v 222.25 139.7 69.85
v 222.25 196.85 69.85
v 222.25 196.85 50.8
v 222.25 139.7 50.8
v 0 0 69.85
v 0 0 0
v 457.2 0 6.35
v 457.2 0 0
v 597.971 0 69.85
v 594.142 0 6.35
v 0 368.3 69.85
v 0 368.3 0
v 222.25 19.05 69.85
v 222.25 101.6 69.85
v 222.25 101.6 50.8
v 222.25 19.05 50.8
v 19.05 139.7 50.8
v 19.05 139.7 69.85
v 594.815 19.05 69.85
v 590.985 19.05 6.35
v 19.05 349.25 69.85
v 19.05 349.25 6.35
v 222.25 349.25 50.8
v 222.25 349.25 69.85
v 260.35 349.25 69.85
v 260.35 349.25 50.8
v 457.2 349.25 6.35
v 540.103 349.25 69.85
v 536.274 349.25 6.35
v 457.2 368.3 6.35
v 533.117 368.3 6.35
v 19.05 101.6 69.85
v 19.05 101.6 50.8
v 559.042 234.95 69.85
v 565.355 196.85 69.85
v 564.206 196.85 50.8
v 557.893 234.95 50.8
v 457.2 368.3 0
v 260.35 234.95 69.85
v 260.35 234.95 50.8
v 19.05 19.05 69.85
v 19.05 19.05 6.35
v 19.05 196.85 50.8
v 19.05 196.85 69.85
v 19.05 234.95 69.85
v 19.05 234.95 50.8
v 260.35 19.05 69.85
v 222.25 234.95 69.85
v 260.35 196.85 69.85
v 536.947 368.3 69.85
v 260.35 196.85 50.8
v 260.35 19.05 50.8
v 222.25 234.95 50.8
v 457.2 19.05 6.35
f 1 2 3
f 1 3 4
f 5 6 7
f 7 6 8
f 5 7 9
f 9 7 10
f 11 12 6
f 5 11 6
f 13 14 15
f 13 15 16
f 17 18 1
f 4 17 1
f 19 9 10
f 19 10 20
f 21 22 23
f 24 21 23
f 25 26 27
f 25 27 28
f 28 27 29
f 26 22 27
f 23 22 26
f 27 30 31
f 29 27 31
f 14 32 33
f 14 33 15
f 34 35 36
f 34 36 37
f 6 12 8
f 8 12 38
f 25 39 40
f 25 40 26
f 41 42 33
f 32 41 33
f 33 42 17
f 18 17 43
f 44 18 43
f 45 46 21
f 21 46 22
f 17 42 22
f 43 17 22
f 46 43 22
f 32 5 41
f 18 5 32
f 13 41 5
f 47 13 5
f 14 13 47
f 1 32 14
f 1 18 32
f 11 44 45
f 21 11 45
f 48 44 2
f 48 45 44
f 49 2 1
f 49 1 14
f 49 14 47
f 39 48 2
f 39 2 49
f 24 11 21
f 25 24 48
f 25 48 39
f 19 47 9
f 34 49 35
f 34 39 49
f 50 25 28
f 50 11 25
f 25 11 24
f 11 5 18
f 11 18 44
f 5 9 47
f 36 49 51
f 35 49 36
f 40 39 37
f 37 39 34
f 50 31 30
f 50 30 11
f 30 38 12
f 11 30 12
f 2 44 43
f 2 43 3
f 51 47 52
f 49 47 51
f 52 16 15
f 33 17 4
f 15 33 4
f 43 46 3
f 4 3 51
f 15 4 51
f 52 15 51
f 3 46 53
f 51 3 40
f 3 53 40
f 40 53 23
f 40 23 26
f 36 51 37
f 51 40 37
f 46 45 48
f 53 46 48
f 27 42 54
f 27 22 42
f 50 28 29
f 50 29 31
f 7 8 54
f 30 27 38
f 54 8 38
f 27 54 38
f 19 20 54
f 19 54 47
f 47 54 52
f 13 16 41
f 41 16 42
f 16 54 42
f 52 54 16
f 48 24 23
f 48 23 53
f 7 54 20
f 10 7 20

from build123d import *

# Parameters (mm, degrees)
F0_W          = 457.2
F0_H          = 368.3
F1_DEPTH      = 6.35
F2_W          = 19.05
F2_H          = 330.2
F2_W_2        = 177.8
F2_H_2        = 19.05
F3_DEPTH      = 63.5
F4_W          = 203.2
F4_H          = 38.1
F4_W_2        = 374.65
F5_DEPTH      = 19.05
F8_DEPTH      = 125.9670187868
F8_DEPTH_BACK = 65.6385295619


# Not quite as in the source:
# - a feature names something its author has since deleted; it is built from what else it names


with BuildPart() as f1:
    # F0 (on Top) → F1 (new body)
    with BuildSketch(Plane.XY):
        with Locations((228.6, 184.15)):
            Rectangle(F0_W, F0_H)
    extrude(amount=F1_DEPTH)

    # F2 (on face) → F3 (join)
    with BuildSketch(Plane.XY.offset(6.35)):
        with Locations((9.525, 184.15)):
            Rectangle(F2_W, F2_H)
        Polygon((0, 368.3), (0, 349.25), (19.05, 349.25), (457.2, 349.25), (457.2, 368.3), align=None)
        Polygon((0, 19.05), (0, 0), (457.2, 0), (457.2, 19.05), (19.05, 19.05), align=None)
        with Locations((546.1, 9.525)):
            Rectangle(F2_W_2, F2_H_2)
        with Locations((546.1, 358.775)):
            Rectangle(F2_W_2, F2_H_2)
    extrude(amount=F3_DEPTH)

    # F4 (on face) → F5 (join)
    with BuildSketch(Plane.XY.offset(69.85)):
        with Locations((120.65, 120.65)):
            Rectangle(F4_W, F4_H)
        Polygon((222.25, 101.6), (222.25, 19.05), (260.35, 19.05), (260.35, 196.85), (260.35, 234.95), (260.35, 349.25), (222.25, 349.25), (222.25, 234.95), (222.25, 196.85), (222.25, 139.7), align=None)
        with Locations((120.65, 215.9)):
            Rectangle(F4_W, F4_H)
        with Locations((447.675, 215.9)):
            Rectangle(F4_W_2, F4_H)
    extrude(amount=-F5_DEPTH)

    # F7 (on face) → F8 (cut, two sides)
    with BuildSketch(Plane(origin=(0, 22.4493572683, 61.6791021759), x_dir=(1, 0, 0), z_dir=(0, -0.3420201433, -0.9396926208))) as f8_sk:
        Polygon((643.6106, 282.7225558054), (513.744137013, -453.7867547107), (643.6106, -453.7867547107), align=None)
    extrude(amount=-F8_DEPTH, mode=Mode.SUBTRACT)
    extrude(f8_sk.sketch, amount=F8_DEPTH_BACK, mode=Mode.SUBTRACT)


solid = f1.part
